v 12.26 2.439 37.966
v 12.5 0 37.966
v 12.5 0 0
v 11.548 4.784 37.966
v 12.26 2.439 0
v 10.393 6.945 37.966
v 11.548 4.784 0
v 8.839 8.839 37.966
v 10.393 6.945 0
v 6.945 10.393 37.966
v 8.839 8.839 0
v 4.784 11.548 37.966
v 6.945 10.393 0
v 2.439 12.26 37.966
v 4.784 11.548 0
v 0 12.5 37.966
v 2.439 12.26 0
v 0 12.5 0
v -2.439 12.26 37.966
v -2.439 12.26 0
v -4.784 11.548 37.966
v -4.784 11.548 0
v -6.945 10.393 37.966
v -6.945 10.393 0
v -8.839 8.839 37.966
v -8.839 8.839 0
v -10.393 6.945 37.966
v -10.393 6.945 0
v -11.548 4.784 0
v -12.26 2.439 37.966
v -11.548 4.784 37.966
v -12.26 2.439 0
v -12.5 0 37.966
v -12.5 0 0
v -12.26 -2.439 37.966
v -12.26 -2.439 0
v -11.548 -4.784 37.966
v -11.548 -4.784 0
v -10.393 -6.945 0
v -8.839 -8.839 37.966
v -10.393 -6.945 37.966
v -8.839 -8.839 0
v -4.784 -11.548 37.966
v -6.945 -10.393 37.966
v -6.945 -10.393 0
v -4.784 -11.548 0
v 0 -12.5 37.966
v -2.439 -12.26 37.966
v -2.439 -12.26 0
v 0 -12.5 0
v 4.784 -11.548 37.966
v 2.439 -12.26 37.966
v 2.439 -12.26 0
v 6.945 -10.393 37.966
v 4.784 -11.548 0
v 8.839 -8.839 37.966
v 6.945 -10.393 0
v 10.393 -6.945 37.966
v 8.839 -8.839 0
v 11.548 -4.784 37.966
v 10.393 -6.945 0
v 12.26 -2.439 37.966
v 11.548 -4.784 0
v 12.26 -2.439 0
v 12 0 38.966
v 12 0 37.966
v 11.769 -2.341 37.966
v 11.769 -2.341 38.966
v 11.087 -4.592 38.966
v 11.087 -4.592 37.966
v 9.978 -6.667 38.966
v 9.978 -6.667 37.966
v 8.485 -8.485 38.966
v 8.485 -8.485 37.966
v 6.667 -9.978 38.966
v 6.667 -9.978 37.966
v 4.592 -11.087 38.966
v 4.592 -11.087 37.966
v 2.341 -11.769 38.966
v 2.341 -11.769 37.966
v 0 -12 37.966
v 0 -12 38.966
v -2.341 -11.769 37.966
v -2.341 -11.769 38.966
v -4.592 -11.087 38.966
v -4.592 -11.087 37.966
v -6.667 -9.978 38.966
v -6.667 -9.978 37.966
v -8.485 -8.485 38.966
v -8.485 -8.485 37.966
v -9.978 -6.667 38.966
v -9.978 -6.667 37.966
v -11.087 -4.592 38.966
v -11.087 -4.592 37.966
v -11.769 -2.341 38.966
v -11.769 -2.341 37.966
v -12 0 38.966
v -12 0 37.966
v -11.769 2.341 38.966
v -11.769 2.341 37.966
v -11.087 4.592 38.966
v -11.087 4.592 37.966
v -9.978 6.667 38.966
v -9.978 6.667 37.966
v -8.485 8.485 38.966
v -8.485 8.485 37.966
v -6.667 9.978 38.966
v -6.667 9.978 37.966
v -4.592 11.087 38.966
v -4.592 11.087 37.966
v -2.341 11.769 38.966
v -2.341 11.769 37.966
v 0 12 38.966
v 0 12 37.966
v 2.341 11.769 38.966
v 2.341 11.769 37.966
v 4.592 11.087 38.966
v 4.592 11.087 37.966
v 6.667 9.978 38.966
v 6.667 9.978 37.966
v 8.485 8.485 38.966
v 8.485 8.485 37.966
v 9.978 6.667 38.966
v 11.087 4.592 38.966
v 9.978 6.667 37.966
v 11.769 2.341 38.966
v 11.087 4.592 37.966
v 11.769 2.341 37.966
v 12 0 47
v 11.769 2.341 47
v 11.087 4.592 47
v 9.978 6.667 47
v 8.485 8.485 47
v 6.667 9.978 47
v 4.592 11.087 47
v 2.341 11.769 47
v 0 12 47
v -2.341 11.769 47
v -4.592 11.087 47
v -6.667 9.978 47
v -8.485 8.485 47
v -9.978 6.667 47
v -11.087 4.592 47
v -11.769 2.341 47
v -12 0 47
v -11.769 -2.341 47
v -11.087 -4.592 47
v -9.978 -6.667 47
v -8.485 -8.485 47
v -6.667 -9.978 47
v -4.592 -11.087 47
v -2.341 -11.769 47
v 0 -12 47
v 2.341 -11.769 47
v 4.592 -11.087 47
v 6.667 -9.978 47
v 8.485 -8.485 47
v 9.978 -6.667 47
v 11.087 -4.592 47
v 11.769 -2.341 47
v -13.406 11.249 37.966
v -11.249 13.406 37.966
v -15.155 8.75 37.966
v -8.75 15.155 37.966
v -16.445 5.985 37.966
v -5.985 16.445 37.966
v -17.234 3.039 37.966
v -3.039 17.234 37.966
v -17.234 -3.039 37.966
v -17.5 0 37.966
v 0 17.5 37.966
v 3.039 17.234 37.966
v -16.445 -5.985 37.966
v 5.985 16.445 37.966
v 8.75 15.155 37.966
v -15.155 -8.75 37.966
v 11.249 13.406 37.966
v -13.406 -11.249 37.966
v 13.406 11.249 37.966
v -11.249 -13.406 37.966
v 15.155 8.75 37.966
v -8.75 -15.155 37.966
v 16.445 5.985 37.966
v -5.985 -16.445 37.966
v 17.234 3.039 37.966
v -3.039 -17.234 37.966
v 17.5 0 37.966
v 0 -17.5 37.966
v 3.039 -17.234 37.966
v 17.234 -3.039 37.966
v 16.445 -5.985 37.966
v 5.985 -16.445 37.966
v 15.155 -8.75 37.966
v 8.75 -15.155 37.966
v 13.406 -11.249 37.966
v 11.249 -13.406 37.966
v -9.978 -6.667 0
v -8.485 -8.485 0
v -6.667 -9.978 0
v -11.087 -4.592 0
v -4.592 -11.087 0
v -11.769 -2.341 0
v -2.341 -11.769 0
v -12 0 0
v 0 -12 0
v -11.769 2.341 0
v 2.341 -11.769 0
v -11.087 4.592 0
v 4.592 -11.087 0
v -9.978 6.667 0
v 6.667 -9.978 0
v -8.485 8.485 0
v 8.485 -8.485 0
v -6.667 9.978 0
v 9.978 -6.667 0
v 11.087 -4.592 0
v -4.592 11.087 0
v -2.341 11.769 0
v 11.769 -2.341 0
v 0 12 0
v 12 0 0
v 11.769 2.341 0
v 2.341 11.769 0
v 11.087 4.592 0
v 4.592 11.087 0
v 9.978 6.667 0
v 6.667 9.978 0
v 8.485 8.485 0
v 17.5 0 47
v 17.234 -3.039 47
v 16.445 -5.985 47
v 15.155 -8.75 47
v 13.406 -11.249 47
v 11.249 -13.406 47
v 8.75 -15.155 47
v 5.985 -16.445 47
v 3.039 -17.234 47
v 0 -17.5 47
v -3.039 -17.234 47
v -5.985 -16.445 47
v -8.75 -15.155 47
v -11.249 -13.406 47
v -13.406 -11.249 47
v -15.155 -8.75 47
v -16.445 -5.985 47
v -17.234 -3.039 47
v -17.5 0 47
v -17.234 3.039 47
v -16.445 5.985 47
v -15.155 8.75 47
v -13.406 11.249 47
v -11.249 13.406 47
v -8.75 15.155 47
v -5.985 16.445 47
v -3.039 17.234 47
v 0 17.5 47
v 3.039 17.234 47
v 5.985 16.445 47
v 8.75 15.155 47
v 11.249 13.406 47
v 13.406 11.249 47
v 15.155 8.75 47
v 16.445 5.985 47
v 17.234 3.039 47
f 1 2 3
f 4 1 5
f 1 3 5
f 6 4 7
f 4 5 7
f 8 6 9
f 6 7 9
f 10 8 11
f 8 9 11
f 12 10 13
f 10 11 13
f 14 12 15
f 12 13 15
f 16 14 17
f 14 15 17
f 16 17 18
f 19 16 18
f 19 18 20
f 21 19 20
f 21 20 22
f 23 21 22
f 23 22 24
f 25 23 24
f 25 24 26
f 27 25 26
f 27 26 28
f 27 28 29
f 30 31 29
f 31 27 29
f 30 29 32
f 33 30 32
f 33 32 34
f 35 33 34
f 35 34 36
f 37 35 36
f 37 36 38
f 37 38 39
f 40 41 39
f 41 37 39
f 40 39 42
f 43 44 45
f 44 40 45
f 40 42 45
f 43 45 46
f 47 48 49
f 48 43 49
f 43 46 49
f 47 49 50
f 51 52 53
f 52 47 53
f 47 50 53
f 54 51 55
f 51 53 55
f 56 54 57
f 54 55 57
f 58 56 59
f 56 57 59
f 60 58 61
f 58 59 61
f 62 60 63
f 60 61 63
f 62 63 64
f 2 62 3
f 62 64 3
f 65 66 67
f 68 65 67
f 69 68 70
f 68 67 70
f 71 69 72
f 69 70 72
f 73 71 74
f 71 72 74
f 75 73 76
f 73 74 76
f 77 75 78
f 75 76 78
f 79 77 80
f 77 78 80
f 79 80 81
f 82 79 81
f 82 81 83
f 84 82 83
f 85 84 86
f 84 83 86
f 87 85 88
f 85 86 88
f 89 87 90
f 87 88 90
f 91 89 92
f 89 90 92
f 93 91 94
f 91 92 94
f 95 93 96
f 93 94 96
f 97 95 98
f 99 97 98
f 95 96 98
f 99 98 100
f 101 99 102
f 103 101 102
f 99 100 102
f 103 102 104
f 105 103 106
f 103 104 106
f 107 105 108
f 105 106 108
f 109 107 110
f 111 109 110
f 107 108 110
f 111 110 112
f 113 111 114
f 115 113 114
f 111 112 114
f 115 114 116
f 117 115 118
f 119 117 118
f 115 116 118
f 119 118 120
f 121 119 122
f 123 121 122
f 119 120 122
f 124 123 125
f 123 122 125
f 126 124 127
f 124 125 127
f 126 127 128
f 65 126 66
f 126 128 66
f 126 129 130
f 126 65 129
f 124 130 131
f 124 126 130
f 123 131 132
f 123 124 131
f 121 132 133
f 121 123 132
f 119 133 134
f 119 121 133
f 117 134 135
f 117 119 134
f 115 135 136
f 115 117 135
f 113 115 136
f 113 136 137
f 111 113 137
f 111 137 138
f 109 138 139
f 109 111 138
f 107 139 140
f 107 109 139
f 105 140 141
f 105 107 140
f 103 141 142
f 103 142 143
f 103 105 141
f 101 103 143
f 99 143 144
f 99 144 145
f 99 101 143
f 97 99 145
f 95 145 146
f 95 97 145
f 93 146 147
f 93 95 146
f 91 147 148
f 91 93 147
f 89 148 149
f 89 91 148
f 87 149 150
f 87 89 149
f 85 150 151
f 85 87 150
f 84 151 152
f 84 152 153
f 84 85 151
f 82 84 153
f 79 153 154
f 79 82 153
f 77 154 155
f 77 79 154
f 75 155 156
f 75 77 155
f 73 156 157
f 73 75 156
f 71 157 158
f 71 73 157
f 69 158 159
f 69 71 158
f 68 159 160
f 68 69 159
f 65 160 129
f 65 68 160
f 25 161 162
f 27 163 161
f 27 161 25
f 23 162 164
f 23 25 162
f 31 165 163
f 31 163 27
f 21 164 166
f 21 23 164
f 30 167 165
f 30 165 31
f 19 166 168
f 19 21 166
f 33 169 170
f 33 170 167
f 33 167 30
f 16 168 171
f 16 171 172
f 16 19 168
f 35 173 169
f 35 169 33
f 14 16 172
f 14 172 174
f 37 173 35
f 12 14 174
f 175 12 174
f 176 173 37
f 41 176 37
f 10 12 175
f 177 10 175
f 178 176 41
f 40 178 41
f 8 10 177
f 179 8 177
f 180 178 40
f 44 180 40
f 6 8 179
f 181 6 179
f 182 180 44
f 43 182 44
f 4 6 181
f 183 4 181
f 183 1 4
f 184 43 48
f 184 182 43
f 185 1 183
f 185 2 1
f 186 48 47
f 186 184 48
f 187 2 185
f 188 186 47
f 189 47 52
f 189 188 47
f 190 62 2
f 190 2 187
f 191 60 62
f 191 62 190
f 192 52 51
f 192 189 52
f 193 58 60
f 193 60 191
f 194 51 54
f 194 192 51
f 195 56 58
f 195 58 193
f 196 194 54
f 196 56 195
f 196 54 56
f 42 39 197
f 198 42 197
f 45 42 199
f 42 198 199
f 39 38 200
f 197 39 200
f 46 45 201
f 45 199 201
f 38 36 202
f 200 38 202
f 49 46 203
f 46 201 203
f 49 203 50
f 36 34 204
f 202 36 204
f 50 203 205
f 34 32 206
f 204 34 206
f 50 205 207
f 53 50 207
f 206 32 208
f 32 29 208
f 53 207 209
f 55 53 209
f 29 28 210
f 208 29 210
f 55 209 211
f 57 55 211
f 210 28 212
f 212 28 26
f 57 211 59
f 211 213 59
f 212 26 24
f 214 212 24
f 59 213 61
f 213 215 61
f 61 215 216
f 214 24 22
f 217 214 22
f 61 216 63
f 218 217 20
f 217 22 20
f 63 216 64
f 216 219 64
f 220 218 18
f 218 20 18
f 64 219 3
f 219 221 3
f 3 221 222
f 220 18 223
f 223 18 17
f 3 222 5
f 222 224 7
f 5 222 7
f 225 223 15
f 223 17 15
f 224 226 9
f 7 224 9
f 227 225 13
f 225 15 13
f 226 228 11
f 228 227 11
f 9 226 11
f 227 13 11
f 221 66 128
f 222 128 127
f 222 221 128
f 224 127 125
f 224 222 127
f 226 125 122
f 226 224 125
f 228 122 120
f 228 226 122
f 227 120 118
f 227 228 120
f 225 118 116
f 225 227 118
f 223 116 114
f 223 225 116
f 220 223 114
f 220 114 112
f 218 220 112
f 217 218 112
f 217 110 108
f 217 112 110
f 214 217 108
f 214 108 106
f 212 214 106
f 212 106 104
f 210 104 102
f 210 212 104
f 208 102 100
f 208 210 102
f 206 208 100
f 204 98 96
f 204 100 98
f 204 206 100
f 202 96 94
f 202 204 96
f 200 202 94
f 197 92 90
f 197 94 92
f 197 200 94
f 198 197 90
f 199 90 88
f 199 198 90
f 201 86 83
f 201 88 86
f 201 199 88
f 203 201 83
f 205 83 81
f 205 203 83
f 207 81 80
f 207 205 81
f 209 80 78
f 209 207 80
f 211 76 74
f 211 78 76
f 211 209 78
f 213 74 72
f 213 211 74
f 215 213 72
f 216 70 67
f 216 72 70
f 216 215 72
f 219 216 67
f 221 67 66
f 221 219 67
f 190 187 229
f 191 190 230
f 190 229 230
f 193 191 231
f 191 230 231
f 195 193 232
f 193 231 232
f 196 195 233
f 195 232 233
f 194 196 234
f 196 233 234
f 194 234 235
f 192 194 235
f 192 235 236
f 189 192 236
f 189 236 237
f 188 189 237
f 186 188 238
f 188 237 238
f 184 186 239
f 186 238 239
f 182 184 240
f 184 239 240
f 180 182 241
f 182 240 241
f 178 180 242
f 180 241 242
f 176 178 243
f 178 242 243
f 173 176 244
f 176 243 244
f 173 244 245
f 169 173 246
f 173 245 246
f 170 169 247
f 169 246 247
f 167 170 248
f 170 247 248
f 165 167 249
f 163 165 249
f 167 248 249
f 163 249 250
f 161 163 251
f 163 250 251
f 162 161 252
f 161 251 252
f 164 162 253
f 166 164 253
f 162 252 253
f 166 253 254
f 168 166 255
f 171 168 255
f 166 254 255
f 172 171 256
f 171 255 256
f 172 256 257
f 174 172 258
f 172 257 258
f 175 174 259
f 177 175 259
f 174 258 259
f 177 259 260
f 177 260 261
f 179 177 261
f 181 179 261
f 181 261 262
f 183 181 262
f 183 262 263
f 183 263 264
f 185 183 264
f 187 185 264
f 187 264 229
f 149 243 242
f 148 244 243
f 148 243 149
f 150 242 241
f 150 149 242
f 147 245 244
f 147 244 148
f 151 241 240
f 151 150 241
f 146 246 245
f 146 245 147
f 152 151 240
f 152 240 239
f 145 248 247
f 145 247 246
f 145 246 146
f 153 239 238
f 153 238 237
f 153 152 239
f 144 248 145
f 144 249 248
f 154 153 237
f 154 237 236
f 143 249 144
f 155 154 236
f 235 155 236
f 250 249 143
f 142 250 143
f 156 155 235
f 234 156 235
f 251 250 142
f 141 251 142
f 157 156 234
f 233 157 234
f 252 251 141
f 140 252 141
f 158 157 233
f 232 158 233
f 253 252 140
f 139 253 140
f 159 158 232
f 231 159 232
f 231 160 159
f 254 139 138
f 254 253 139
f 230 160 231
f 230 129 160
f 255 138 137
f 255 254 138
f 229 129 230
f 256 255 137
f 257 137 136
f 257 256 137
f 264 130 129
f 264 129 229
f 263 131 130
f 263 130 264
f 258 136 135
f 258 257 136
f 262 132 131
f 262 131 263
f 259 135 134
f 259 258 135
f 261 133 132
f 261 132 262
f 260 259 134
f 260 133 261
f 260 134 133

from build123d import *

# Parameters (mm, degrees)
SKETCH_1_R           = 12.5
SKETCH_1_R_2         = 12
EXTRUDE_1_DEPTH      = 40
EXTRUDE_2_DEPTH      = 7
EXTRUDE_2_DEPTH_BACK = 1.034218613
SKETCH_2_R           = 17.5
SKETCH_2_R_2         = 12
SKETCH_3_R           = 17.5
EXTRUDE_3_DEPTH      = 1
SKETCH_4_R           = 12
CUT_EXTRUDE_1_DEPTH  = 1


with BuildPart() as part:
    # Эскиз1 → Бобышка-Вытянуть1 (new body)
    with BuildSketch(Plane.XY):
        Circle(SKETCH_1_R)
        Circle(SKETCH_1_R_2, mode=Mode.SUBTRACT)
    extrude(amount=EXTRUDE_1_DEPTH)

    # Эскиз2 → Бобышка-Вытянуть2 (add, two sides: drawn at the far end of the back side and taken through both)
    with BuildSketch(Plane.XY.offset(40).offset(-EXTRUDE_2_DEPTH_BACK)):
        Circle(SKETCH_2_R)
        Circle(SKETCH_2_R_2, mode=Mode.SUBTRACT)
    extrude(amount=EXTRUDE_2_DEPTH + EXTRUDE_2_DEPTH_BACK)

    # Эскиз3 → Бобышка-Вытянуть3 (add)
    with BuildSketch(Plane(origin=(0, 0, 38.965781387), x_dir=(-1, 0, 0), z_dir=(0, 0, -1))):
        with Locations(Location((0, 0, 0), (0, 0, 180))):
            Circle(SKETCH_3_R)
    extrude(amount=EXTRUDE_3_DEPTH)

    # Эскиз4 → Вырез-Вытянуть1 (cut)
    with BuildSketch(Plane(origin=(0, 0, 37.965781387), x_dir=(-1, 0, 0), z_dir=(0, 0, -1))):
        with Locations(Location((0, 0, 0), (0, 0, 180))):
            Circle(SKETCH_4_R)
    extrude(amount=-CUT_EXTRUDE_1_DEPTH, mode=Mode.SUBTRACT)


solid = part.part
